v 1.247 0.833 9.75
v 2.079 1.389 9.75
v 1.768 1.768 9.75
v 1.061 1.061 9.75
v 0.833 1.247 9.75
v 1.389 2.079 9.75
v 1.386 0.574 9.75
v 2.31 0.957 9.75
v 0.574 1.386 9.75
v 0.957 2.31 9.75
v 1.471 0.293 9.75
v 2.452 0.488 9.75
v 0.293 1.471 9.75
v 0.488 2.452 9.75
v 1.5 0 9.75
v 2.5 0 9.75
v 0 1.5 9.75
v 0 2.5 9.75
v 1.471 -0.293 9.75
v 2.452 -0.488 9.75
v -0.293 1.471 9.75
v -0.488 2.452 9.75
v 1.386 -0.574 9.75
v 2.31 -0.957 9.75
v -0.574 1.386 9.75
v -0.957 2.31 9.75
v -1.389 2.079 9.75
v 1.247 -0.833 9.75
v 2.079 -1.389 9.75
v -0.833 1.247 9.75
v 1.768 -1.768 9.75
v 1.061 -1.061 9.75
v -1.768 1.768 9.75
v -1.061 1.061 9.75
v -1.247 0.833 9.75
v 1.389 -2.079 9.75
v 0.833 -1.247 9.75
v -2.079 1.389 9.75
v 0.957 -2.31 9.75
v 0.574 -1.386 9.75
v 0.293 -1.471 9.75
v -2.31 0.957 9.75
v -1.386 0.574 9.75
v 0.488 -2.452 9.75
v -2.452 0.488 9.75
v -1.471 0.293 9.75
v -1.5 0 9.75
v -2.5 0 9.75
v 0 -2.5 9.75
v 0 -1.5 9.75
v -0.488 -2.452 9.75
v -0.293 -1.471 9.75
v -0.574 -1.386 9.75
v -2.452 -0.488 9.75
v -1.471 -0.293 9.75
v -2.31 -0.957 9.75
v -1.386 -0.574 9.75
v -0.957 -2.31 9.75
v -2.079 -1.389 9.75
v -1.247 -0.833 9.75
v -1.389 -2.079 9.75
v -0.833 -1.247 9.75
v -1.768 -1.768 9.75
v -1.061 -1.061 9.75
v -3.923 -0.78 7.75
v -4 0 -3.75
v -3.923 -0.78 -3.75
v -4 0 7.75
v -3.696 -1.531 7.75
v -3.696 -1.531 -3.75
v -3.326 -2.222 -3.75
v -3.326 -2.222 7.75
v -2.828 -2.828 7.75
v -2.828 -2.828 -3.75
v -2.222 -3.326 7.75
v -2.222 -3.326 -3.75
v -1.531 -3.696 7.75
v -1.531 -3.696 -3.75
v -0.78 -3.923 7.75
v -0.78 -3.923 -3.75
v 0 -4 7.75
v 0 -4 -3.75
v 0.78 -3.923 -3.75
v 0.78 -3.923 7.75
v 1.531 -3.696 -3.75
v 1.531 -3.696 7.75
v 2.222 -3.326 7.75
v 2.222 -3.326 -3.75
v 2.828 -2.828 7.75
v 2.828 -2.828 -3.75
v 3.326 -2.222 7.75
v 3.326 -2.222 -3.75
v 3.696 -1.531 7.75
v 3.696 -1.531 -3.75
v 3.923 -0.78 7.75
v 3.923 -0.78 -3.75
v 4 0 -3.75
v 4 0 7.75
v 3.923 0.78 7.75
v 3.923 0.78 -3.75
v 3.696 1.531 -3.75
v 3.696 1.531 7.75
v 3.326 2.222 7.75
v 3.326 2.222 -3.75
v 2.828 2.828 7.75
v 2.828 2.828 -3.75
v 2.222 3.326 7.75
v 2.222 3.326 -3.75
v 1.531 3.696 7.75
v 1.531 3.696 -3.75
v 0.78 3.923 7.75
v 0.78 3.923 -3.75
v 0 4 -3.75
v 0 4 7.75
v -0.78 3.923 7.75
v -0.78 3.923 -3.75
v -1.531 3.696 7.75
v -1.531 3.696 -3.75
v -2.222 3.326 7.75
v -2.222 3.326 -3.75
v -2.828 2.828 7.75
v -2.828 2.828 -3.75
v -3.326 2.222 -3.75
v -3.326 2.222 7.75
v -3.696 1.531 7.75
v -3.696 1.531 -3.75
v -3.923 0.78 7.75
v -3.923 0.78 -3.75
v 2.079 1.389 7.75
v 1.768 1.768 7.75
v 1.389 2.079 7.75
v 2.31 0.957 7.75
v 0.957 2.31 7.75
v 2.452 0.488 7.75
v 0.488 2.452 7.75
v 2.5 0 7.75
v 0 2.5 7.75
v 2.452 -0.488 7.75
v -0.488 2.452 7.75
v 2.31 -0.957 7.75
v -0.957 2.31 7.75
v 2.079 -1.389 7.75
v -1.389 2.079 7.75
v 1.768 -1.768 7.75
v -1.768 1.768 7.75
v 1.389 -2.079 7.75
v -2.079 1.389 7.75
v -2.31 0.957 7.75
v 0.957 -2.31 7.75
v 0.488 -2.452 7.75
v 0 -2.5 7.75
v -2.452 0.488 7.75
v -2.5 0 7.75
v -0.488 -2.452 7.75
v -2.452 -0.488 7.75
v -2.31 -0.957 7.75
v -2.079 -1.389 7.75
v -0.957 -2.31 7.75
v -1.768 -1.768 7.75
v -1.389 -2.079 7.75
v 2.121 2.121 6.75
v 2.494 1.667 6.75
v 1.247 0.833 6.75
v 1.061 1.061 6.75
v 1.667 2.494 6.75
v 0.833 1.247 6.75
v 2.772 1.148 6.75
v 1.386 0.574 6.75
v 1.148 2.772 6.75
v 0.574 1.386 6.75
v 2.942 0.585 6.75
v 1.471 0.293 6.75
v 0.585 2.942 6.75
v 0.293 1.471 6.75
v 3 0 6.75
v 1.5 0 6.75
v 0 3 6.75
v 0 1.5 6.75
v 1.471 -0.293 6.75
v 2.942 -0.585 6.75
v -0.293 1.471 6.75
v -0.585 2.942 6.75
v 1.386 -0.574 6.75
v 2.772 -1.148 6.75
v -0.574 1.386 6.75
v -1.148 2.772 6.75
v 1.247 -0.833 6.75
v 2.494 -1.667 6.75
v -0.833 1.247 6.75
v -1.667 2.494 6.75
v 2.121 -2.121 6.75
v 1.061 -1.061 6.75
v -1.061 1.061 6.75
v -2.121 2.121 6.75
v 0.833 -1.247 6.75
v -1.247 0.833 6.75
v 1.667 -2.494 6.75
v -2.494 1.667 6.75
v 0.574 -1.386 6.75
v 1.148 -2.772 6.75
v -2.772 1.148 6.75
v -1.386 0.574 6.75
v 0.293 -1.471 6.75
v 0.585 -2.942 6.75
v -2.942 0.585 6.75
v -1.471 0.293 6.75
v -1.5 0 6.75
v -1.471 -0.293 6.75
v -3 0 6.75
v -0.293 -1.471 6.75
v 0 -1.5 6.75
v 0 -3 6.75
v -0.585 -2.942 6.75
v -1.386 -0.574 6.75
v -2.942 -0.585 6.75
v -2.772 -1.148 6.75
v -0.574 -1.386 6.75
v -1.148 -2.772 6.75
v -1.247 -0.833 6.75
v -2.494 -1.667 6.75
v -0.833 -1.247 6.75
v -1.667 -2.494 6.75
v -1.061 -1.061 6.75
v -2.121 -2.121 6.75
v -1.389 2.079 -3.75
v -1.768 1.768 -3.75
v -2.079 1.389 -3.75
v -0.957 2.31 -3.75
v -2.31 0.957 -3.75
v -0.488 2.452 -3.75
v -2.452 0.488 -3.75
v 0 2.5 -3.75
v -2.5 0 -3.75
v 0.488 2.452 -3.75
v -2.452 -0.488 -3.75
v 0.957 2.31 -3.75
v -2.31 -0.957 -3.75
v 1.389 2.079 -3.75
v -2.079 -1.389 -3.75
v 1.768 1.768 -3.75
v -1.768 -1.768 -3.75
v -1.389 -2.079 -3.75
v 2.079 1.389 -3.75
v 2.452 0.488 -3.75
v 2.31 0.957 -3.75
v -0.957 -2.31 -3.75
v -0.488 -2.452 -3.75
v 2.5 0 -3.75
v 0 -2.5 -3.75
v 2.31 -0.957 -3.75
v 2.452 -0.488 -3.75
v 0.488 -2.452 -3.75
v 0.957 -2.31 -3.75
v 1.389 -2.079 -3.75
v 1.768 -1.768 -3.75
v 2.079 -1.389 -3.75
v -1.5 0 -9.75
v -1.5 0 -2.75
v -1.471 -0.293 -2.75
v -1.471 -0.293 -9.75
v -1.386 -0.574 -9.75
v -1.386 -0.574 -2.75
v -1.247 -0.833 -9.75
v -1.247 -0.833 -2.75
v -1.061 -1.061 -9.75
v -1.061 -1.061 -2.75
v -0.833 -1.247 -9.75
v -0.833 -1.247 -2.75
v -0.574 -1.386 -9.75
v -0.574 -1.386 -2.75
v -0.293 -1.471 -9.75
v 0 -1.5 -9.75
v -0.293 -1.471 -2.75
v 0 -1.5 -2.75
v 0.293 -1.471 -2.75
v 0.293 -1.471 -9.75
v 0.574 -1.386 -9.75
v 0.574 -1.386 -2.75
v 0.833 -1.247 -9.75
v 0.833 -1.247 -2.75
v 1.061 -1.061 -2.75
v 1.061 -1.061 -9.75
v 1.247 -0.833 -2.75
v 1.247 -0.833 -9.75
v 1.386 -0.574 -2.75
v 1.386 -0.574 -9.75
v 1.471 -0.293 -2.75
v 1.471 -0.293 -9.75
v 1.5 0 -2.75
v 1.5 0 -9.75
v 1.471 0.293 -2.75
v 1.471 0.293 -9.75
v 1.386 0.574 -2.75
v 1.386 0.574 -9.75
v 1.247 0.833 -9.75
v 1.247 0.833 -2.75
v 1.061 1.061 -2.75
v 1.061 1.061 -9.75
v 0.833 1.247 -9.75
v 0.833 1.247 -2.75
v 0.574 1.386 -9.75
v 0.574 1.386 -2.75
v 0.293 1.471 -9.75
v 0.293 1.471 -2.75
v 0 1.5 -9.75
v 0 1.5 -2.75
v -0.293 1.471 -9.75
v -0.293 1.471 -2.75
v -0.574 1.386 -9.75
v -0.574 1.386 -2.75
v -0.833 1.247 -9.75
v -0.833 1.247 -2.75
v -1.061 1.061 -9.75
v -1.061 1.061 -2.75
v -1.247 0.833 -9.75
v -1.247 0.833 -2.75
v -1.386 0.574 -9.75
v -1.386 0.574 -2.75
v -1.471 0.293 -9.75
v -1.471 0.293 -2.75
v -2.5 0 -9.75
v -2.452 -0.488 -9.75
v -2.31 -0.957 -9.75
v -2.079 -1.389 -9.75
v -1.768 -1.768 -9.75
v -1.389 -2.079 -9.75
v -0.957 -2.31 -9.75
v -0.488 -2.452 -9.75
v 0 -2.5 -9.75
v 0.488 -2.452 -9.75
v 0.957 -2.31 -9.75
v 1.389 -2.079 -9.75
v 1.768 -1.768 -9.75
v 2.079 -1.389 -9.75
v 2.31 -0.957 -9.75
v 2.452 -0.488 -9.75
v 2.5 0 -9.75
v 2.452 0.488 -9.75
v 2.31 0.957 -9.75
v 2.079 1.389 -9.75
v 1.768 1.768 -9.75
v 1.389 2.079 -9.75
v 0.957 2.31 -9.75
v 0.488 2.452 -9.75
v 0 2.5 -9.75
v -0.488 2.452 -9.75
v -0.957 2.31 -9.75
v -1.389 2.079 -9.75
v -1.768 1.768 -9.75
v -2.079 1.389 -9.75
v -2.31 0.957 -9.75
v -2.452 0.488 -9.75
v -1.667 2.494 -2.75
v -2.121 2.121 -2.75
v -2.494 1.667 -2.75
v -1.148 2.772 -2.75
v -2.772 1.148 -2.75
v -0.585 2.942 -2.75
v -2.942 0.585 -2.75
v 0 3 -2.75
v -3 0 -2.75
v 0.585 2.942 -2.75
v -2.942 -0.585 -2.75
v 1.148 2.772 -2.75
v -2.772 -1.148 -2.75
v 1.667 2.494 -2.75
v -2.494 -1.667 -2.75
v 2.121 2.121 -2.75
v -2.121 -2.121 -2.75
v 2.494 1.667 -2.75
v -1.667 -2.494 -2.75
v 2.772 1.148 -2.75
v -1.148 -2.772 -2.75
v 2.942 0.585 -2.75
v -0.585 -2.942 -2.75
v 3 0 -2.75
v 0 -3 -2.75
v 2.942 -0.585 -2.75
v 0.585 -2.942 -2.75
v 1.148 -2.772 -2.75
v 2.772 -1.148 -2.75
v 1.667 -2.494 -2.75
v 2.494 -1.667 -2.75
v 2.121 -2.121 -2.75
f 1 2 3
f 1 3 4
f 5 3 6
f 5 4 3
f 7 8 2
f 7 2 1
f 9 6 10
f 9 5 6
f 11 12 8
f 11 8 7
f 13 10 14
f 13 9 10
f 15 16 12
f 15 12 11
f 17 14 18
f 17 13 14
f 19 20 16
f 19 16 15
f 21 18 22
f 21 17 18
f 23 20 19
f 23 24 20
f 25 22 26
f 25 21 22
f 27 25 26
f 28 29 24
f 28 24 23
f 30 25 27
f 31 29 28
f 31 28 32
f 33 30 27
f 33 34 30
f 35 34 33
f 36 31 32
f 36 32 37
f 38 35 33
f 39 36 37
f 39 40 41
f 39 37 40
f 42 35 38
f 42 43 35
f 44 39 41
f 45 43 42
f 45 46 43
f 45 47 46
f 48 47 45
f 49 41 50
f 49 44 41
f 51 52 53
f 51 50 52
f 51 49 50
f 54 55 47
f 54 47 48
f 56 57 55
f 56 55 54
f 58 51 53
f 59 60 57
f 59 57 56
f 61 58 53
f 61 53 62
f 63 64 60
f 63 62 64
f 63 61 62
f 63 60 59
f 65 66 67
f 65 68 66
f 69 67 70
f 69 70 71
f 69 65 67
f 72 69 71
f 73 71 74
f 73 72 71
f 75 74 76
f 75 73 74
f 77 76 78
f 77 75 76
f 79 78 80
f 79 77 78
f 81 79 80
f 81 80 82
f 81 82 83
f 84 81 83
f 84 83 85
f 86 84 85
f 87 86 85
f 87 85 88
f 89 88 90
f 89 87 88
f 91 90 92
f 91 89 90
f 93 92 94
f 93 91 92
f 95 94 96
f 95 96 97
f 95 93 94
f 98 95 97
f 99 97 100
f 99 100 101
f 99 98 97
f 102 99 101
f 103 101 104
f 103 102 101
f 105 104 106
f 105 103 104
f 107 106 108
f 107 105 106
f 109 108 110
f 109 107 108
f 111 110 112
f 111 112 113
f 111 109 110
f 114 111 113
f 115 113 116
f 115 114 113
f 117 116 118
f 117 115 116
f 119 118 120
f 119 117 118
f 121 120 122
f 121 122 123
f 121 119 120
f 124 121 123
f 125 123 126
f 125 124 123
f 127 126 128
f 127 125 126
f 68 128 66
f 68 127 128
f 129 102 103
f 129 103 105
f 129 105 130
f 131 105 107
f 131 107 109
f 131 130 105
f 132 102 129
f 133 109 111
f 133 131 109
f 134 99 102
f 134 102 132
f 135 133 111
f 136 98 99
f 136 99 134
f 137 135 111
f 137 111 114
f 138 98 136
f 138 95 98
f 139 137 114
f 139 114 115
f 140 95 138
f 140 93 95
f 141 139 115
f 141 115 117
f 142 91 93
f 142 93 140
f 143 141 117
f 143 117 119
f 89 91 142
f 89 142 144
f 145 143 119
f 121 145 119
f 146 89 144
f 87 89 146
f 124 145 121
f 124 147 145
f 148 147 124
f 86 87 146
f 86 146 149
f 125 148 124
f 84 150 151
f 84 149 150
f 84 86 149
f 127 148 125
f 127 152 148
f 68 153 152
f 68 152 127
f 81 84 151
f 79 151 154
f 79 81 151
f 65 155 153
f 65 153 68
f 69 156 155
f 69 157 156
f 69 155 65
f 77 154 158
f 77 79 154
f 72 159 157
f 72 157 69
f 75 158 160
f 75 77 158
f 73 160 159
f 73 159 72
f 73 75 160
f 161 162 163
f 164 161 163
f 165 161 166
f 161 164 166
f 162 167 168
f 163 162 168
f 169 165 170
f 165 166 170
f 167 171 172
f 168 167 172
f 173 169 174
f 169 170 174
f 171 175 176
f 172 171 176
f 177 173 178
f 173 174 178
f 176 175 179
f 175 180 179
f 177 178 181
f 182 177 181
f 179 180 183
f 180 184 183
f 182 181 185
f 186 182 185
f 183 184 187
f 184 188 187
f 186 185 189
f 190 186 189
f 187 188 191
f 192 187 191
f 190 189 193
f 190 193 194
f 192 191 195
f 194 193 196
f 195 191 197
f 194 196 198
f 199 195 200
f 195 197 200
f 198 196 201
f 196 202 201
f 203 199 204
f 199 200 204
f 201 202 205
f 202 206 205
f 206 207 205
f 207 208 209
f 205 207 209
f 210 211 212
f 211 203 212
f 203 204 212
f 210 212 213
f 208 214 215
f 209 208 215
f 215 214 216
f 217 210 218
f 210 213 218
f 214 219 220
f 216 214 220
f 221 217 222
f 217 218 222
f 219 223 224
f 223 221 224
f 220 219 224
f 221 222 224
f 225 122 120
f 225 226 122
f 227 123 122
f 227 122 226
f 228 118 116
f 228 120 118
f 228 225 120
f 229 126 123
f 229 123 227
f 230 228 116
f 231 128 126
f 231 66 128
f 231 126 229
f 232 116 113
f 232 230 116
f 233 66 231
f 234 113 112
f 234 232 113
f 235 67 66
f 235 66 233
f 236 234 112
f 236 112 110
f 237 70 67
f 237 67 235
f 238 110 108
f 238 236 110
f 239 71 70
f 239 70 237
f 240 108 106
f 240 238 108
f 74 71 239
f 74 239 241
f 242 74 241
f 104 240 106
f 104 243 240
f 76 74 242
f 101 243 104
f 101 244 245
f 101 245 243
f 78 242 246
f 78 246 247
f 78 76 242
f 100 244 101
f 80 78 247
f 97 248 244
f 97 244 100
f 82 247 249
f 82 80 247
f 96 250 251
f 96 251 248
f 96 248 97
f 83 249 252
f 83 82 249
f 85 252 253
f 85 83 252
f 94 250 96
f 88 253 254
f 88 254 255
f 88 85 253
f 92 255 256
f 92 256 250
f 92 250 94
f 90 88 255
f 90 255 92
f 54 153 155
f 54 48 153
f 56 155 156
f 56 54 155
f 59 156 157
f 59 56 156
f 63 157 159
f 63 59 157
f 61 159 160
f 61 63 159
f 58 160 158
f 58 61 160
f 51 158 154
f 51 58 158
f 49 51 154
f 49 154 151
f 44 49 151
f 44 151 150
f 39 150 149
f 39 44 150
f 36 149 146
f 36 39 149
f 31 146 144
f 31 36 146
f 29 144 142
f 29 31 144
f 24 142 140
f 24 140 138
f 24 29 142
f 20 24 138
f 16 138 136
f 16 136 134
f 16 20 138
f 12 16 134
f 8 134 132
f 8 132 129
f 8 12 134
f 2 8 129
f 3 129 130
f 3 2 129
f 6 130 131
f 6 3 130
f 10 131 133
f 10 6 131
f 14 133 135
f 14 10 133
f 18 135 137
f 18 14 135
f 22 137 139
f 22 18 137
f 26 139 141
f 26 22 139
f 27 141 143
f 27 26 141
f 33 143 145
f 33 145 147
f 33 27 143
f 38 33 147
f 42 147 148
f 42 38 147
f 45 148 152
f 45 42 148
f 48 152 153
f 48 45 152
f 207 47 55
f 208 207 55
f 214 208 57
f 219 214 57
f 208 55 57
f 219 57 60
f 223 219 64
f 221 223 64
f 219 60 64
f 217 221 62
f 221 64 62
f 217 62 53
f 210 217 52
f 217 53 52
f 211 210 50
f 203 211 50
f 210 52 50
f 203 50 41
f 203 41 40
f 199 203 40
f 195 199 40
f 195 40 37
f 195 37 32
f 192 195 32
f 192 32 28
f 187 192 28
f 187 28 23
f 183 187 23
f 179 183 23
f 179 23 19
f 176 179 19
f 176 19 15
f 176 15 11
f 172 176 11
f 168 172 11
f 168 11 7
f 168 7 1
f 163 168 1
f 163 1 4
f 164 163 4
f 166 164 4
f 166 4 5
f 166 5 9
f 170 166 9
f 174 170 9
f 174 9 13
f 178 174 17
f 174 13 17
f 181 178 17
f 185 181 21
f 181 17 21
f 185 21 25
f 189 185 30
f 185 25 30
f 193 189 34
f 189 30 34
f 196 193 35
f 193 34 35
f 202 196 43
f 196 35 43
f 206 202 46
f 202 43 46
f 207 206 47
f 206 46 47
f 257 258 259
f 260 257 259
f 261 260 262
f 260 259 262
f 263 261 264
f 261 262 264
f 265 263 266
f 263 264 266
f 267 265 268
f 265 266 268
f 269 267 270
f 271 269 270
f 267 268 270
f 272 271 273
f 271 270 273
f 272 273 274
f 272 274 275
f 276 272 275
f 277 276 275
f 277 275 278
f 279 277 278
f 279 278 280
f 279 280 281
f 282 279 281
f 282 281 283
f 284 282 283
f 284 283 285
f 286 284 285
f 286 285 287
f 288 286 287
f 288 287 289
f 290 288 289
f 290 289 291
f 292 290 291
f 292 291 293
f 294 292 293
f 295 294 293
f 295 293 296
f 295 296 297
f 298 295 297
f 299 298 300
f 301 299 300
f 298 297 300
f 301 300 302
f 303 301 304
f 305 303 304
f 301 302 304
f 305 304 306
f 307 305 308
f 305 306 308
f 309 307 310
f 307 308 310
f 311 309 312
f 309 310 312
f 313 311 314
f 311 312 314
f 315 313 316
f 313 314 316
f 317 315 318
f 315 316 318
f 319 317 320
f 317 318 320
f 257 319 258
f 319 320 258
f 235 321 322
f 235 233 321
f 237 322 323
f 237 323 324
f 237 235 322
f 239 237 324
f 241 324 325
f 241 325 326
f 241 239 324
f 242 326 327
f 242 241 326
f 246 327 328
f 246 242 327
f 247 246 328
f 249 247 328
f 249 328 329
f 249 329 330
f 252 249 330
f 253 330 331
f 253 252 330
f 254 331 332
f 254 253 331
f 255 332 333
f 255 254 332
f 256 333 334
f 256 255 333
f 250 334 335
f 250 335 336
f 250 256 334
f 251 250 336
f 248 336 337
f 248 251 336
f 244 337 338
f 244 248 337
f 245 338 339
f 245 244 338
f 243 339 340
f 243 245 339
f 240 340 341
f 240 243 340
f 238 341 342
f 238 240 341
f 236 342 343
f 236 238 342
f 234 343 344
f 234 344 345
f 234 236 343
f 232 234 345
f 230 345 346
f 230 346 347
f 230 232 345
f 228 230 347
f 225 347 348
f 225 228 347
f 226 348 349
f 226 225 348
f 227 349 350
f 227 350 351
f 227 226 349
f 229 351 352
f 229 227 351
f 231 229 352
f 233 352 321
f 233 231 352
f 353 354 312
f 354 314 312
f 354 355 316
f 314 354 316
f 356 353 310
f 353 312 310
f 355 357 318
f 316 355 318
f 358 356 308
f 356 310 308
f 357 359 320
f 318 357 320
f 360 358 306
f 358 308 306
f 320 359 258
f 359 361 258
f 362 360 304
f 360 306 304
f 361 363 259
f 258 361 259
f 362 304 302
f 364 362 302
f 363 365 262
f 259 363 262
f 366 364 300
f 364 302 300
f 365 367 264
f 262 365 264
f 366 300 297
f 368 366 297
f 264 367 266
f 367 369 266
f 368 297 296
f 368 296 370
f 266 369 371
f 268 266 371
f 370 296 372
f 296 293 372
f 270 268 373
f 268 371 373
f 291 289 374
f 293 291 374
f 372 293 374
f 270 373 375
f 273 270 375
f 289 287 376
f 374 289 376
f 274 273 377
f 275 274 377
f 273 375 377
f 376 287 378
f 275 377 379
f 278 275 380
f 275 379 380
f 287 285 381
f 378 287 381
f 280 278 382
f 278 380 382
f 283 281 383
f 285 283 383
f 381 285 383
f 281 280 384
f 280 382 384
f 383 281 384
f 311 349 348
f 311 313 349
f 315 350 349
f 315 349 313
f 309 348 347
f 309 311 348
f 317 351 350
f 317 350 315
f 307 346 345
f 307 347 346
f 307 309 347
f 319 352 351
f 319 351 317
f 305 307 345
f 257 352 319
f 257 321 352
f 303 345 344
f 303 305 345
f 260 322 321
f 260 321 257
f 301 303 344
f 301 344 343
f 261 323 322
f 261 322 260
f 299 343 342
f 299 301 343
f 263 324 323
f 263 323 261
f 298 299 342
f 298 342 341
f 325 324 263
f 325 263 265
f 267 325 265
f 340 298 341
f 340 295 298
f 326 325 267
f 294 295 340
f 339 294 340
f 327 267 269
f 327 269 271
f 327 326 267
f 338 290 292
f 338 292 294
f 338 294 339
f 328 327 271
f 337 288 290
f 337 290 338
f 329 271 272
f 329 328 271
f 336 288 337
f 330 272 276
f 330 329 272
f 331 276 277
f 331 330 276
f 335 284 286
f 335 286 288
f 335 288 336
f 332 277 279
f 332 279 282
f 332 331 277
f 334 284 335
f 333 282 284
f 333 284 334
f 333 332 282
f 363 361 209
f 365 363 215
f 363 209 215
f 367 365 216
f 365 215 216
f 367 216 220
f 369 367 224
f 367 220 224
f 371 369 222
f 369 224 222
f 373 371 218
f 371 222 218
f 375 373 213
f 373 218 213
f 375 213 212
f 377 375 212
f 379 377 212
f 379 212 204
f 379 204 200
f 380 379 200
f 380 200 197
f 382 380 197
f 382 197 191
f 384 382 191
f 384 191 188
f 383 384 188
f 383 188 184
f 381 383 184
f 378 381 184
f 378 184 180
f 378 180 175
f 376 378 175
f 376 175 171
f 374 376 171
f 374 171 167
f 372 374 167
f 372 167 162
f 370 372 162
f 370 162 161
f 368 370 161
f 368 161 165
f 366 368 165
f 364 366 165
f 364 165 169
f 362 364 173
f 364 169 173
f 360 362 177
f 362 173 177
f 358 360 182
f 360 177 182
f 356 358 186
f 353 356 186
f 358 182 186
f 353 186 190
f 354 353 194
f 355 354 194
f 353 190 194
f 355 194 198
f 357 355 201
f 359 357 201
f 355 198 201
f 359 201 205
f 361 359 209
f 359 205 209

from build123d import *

# Parameters (mm, degrees)
SHELL1_T = -1


with BuildPart() as part:
    # Sketch1 → Revolve1 (revolve)
    with BuildSketch(Plane(origin=(0, 0, 0), x_dir=(1, 0, 0), z_dir=(0, 1, 0)), mode=Mode.PRIVATE) as revolve1_sk:
        Polygon((0, 9.75), (2.5, 9.75), (2.5, 3.75), (4, 3.75), (4, -7.75), (2.5, -7.75), (2.5, -9.75), (0, -9.75), align=None)
    revolve(revolve1_sk.sketch.rotate(Axis((0, 0, -28.532608696), (0, 0, 1)), 180), axis=Axis((0, 0, -28.532608696), (0, 0, 1)))

    # Shell1
    shell1_openings = [part.faces().sort_by_distance(p)[0] for p in [
        (0, 0, 9.75),
        (0, 0, -9.75),
    ]]
    offset(amount=SHELL1_T, openings=shell1_openings, kind=Kind.INTERSECTION)


solid = part.part
